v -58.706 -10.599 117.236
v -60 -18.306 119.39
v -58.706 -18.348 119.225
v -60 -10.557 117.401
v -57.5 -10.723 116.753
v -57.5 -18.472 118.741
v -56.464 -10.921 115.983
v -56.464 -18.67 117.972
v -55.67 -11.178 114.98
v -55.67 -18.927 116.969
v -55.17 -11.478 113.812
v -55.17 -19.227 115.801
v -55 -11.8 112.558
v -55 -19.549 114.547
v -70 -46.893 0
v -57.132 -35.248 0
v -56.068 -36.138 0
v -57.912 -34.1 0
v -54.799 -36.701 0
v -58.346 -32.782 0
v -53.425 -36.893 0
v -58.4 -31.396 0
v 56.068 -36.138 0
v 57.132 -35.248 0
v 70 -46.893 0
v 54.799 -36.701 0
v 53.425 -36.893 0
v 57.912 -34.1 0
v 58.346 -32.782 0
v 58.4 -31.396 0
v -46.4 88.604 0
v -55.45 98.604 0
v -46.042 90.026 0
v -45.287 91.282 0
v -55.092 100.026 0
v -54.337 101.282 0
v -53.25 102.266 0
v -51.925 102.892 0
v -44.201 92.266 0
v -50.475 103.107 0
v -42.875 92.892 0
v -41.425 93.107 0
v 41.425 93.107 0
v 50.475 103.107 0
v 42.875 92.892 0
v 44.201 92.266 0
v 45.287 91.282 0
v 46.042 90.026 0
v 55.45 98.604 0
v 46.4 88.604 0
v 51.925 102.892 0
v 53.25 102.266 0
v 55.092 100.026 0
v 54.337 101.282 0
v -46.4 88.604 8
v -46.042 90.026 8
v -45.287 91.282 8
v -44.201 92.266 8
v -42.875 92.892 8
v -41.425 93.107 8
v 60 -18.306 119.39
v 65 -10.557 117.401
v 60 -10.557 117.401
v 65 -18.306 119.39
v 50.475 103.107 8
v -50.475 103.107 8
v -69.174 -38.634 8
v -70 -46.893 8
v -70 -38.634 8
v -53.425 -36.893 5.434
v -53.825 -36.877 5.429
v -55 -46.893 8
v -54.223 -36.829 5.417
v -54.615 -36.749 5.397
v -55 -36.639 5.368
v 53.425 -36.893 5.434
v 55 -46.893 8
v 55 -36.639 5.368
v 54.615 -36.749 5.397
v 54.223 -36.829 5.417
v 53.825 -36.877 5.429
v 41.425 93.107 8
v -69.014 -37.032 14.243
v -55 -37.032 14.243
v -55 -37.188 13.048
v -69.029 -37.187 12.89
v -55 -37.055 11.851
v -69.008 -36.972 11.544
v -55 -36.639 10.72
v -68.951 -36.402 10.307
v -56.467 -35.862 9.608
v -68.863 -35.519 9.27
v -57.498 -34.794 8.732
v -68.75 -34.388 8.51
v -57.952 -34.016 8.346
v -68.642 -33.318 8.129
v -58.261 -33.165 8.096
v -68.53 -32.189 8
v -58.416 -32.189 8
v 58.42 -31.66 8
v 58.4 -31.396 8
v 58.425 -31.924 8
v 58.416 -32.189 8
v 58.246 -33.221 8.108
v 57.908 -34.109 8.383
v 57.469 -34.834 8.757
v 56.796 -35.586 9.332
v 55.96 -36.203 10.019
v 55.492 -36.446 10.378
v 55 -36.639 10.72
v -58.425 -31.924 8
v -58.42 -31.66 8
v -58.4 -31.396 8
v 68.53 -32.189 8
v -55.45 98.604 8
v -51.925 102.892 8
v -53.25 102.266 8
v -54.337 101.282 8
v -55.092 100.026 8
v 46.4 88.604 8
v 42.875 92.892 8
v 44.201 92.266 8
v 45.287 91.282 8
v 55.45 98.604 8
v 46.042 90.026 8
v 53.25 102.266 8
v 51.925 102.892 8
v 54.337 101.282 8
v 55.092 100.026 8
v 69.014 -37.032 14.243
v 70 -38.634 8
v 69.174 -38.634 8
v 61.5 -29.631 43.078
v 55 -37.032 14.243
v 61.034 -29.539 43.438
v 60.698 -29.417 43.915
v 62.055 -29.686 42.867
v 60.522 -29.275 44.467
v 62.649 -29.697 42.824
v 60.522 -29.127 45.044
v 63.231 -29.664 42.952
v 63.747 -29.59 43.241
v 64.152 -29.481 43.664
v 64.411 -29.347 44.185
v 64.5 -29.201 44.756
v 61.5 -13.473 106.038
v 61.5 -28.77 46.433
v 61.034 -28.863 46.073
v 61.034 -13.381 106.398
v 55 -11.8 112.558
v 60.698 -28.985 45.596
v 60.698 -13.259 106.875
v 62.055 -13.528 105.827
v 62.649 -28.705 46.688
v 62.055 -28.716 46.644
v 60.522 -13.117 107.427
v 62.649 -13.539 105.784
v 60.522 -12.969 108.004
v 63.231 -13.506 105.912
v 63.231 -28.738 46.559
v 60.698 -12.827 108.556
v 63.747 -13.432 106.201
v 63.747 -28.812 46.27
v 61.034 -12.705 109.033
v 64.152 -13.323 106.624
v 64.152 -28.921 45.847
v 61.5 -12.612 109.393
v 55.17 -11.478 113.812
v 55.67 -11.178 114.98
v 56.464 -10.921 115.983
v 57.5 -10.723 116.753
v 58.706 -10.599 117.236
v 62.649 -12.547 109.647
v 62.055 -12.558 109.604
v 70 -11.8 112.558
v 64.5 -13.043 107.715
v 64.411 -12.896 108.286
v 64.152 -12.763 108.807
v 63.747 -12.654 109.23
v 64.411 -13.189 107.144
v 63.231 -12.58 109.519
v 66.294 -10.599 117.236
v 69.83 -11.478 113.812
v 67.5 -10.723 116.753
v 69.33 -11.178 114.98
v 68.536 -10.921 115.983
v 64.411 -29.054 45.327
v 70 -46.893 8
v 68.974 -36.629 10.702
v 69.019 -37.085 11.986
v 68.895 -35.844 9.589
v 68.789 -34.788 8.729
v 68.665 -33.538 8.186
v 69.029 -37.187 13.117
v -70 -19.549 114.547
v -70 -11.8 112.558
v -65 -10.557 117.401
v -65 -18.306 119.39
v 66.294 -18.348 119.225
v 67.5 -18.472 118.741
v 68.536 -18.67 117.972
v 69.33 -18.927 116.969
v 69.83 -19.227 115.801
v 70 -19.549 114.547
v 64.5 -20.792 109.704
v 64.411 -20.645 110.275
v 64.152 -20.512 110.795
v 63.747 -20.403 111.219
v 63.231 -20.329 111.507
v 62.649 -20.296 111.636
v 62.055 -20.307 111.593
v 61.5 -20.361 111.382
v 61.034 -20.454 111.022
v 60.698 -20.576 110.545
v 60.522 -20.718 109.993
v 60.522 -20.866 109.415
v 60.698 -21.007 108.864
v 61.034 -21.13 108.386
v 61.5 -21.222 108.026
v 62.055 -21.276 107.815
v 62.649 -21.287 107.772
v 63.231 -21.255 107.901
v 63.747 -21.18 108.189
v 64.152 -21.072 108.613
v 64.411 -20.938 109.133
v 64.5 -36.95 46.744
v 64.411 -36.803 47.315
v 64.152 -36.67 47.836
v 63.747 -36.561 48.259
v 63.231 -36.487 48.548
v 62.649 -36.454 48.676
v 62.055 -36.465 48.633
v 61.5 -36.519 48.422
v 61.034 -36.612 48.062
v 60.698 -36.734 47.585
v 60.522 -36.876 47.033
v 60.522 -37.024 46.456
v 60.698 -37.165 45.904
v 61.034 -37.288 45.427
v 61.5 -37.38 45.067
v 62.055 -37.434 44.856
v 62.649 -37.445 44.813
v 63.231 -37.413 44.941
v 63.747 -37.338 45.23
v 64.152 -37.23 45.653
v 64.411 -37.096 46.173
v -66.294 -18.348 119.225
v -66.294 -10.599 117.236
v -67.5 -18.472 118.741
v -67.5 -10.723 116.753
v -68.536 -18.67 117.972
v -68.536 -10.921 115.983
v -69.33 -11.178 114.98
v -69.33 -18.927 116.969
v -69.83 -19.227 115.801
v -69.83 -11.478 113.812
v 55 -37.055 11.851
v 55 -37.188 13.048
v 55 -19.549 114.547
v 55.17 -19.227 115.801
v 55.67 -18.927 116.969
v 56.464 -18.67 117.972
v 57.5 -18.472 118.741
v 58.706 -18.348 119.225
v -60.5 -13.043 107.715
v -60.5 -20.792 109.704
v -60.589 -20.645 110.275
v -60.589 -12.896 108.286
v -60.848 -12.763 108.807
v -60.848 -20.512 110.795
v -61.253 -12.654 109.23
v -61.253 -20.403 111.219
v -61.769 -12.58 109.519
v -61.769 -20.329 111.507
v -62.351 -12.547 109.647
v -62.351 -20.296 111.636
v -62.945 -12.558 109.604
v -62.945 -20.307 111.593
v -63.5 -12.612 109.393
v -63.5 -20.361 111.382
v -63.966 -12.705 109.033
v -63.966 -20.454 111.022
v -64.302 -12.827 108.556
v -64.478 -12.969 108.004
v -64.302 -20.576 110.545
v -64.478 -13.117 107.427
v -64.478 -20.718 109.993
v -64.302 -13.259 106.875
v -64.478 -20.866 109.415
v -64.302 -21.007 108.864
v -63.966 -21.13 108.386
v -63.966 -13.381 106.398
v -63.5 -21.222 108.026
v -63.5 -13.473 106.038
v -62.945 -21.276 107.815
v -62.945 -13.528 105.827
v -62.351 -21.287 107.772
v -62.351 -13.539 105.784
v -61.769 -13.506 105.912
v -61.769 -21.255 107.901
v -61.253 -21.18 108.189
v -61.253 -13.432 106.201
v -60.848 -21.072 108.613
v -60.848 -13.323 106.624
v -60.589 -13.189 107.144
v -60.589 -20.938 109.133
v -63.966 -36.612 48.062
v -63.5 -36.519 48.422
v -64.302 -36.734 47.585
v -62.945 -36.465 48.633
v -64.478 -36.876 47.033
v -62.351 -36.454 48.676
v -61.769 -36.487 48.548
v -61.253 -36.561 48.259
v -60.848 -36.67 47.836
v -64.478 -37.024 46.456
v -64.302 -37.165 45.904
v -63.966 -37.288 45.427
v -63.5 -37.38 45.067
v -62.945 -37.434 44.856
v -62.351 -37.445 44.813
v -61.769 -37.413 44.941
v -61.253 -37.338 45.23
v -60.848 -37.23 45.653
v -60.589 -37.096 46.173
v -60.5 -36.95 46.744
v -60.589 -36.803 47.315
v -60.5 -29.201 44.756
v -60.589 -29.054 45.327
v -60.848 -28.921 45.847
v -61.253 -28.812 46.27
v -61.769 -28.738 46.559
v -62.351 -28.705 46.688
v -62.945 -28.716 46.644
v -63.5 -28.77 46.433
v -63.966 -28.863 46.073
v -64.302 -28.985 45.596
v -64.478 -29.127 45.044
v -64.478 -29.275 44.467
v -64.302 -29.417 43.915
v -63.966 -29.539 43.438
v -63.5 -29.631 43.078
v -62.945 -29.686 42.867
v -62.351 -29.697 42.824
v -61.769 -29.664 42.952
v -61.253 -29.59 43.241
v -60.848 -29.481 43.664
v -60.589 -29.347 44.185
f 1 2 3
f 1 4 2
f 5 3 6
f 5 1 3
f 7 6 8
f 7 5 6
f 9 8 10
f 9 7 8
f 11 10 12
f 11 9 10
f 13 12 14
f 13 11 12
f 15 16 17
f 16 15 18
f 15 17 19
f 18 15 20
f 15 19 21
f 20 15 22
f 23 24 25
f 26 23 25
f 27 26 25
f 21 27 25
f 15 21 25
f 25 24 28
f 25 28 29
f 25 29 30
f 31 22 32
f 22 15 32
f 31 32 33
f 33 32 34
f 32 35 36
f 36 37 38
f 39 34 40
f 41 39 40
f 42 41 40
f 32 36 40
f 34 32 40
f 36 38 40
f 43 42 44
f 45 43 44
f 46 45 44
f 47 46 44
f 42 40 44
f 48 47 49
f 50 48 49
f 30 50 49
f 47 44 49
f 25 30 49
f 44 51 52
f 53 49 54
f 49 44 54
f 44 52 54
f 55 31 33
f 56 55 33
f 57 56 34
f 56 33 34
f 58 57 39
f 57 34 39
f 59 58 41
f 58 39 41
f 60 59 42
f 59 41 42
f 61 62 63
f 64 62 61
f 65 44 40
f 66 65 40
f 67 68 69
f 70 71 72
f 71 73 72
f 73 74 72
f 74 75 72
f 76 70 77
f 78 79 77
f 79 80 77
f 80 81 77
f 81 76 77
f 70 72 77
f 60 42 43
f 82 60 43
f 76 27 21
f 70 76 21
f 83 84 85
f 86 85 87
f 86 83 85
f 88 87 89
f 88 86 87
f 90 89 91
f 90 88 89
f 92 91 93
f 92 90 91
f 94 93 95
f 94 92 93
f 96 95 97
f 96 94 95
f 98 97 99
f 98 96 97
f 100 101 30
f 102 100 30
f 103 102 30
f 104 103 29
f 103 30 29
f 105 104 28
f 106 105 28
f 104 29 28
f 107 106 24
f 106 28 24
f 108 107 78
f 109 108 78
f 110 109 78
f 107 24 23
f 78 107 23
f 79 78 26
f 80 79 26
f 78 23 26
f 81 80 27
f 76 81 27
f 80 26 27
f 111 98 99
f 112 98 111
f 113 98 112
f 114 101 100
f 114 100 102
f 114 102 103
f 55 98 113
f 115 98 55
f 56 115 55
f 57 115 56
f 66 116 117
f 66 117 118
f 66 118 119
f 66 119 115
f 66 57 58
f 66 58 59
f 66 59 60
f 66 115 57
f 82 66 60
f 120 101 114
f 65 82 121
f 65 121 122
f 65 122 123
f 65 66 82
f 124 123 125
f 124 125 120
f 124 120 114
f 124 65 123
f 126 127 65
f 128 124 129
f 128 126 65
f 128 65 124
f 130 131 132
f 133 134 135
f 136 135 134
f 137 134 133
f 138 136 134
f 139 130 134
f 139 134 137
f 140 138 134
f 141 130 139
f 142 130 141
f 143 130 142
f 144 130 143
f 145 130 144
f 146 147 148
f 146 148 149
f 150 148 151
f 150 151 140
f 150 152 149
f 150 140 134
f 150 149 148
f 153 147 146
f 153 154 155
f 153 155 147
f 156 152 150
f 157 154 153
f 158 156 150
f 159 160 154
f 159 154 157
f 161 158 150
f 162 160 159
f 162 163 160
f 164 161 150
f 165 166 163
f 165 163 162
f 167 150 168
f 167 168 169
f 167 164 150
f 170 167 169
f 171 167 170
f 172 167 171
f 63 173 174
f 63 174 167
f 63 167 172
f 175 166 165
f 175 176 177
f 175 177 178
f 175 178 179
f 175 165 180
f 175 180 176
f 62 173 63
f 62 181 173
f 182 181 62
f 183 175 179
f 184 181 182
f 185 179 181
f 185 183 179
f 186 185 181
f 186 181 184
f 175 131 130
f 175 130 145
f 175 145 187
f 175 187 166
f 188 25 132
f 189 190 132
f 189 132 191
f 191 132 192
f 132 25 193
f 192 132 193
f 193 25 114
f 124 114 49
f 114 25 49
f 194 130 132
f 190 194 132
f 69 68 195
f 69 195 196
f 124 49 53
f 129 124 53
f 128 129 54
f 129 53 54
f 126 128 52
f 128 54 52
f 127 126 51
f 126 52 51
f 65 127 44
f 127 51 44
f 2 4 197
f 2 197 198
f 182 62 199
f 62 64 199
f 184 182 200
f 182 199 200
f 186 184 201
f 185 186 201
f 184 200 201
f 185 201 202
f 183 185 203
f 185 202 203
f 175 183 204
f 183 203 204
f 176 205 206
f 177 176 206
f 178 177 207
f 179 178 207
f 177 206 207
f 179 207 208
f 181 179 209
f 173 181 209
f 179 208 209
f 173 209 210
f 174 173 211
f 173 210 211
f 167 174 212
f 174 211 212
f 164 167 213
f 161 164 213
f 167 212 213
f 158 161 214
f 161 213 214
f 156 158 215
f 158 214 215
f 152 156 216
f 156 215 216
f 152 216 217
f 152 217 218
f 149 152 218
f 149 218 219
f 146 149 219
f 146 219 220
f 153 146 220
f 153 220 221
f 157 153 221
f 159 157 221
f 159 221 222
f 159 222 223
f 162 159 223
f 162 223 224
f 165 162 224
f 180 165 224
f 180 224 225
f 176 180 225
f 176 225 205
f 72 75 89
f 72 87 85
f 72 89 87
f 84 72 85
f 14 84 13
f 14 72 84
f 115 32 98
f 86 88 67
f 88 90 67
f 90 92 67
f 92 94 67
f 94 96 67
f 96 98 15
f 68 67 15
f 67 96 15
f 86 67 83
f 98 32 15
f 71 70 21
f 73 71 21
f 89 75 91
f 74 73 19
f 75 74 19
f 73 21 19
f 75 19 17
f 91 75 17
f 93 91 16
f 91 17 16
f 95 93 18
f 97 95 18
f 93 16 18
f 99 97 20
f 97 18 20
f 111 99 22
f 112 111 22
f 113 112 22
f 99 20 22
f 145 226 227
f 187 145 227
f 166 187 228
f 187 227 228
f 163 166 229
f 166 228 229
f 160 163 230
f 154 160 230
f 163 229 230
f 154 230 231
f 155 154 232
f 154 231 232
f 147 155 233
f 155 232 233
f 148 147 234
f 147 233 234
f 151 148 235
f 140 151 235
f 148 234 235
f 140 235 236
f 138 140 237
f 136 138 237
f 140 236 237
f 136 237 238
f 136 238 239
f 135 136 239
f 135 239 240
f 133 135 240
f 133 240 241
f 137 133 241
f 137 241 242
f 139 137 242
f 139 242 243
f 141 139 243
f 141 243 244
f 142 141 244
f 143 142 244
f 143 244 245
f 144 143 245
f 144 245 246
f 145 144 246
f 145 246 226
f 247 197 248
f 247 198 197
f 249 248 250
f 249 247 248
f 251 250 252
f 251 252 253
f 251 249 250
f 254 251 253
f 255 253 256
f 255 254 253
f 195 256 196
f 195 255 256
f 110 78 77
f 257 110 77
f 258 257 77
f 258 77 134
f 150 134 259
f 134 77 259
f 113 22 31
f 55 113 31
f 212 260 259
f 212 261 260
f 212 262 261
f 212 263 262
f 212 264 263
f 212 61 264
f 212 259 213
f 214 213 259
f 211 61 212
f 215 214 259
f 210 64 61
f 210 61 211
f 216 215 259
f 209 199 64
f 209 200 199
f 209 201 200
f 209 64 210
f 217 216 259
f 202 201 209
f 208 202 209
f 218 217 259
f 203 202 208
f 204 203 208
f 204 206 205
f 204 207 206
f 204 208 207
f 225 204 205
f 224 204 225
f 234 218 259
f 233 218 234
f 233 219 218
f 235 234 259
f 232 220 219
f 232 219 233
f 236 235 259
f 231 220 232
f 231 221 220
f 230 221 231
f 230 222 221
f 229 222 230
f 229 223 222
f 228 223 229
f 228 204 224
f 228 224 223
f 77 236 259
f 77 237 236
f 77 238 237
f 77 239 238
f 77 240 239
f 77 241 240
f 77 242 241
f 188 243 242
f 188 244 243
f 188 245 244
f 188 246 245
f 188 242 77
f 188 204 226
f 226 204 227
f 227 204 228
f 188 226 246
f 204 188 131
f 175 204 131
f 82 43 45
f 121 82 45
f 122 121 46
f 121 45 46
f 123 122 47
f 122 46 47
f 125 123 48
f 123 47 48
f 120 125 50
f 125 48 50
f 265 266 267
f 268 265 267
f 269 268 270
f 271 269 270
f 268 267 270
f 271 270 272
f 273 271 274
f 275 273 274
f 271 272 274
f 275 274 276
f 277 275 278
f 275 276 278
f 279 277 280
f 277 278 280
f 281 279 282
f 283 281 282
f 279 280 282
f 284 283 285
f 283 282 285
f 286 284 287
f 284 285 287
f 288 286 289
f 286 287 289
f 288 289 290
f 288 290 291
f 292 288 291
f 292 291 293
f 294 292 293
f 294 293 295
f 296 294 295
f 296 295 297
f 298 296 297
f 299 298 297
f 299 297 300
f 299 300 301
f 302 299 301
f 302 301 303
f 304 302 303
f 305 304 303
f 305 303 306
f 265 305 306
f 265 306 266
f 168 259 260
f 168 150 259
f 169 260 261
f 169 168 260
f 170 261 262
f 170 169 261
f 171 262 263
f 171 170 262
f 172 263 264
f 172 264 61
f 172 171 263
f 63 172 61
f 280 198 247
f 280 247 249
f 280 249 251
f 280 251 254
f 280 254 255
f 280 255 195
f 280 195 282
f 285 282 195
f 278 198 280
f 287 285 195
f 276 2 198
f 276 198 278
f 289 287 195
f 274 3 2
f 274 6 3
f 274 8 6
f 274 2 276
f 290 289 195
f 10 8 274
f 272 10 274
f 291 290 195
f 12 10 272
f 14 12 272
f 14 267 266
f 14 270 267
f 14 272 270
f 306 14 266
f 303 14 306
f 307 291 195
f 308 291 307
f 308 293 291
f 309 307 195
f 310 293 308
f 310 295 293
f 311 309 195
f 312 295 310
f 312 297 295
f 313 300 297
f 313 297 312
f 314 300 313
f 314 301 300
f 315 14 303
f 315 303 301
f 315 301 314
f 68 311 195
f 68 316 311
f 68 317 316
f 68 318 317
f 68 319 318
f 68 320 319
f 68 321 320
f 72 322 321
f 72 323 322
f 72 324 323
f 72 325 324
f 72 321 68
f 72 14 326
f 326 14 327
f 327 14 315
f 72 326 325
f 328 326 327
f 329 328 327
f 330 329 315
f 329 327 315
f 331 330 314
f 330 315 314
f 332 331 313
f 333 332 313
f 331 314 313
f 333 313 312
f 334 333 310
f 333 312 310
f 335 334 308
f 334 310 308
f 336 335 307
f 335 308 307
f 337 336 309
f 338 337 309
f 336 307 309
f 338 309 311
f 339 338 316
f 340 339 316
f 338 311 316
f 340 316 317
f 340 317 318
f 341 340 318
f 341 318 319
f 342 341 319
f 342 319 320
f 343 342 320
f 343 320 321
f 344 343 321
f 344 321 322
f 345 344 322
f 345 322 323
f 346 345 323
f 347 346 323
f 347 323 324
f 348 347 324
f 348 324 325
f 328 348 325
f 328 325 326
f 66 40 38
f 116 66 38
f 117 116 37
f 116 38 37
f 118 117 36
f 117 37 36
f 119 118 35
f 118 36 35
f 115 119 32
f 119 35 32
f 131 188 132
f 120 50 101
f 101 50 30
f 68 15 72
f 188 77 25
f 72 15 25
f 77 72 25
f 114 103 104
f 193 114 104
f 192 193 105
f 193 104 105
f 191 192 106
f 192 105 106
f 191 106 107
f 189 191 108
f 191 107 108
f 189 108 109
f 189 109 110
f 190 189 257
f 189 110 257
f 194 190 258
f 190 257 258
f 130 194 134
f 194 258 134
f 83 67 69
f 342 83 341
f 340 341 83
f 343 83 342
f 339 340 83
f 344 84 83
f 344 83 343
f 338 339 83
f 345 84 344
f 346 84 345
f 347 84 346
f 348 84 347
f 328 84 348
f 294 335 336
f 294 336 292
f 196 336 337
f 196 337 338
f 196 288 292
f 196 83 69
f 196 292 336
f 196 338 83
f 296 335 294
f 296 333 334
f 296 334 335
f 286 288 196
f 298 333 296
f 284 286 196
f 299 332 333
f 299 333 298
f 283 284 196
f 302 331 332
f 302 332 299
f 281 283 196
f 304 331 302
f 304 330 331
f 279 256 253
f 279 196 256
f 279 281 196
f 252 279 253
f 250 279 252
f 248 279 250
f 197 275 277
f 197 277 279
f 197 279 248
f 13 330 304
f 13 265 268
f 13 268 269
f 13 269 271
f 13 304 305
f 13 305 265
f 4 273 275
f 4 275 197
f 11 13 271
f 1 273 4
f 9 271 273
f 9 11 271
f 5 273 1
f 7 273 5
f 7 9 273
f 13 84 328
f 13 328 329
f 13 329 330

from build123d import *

# Parameters (mm, degrees)
F1_DEPTH      = 8
F3_DEPTH      = 70
F3_DEPTH_BACK = 70
F4_W          = 110
F4_H          = 115
F4_R          = 2
F5_DEPTH      = 10.5877977107
F6_R          = 5
F7_R          = 5


with BuildPart() as f1:
    # F0 (on Top) → F1 (new body)
    with BuildSketch(Plane.XY):
        with BuildLine():
            Line((-55.4502481405, 98.6044170713), (-70, -46.8931015238))
            Line((-70, -46.8931015238), (70, -46.8931015238))
            Line((70, -46.8931015238), (55.4502481405, 98.6044170713))
            ThreePointArc((55.4502481405, 98.6044170713), (53.8300887932, 101.8141611439), (50.4750621894, 103.1068984762))
            Line((50.4750621894, 103.1068984762), (-50.4750621894, 103.1068984762))
            ThreePointArc((-50.4750621894, 103.1068984762), (-53.8300887932, 101.8141611439), (-55.4502481405, 98.6044170713))
        make_face()
        with BuildLine():
            Line((-41.4251865683, 93.1068984762), (41.4251865683, 93.1068984762))
            ThreePointArc((41.4251865683, 93.1068984762), (44.7802131721, 91.8141611439), (46.4003725194, 88.6044170713))
            Line((46.4003725194, 88.6044170713), (58.4003725194, -31.3955829287))
            ThreePointArc((58.4003725194, -31.3955829287), (57.1324492361, -35.2481281276), (53.4251865683, -36.8931015238))
            Line((53.4251865683, -36.8931015238), (-53.4251865683, -36.8931015238))
            ThreePointArc((-53.4251865683, -36.8931015238), (-57.1324492361, -35.2481281276), (-58.4003725194, -31.3955829287))
            Line((-58.4003725194, -31.3955829287), (-46.4003725194, 88.6044170713))
            ThreePointArc((-46.4003725194, 88.6044170713), (-44.7802131721, 91.8141611439), (-41.4251865683, 93.1068984762))
        make_face(mode=Mode.SUBTRACT)
    extrude(amount=F1_DEPTH)

    # F2 (on Right) → F3 (join, two sides)
    with BuildSketch(Plane.YZ) as f3_sk:
        Polygon((-18.3058557984, 119.3901673481), (-46.8931015238, 8), (-38.633844698, 8), (-35.4294686048, 20.4858474544), (-10.5569745916, 117.4014893846), align=None)
    extrude(amount=F3_DEPTH)
    extrude(f3_sk.sketch, amount=-F3_DEPTH_BACK)

    # F4 (on face) → F5 (cut, through all)
    with BuildSketch(Plane(origin=(0, -45.9216252544, 11.7853560733), x_dir=(1, 0, 0), z_dir=(0, -0.9686101509, 0.2485847454))):
        with Locations((0, 53.5919715017)):
            Rectangle(F4_W, F4_H)
        with Locations((-62.5, 101.0919715017)):
            Circle(F4_R)
        with Locations((-62.5, 36.0919715017)):
            Circle(F4_R)
        with Locations((62.5, 36.0919715017)):
            Circle(F4_R)
        with Locations((62.5, 101.0919715017)):
            Circle(F4_R)
    extrude(amount=-F5_DEPTH, mode=Mode.SUBTRACT)

    # F6
    f6_edges = [f1.edges().sort_by_distance(p)[0] for p in [
        (-70, -14.431415, 118.395828),
        (-55, -14.431415, 118.395828),
        (55, -14.431415, 118.395828),
        (70, -14.431415, 118.395828),
    ]]
    fillet(f6_edges, radius=F6_R)

    # F7
    f7_edges = [f1.edges().sort_by_distance(p)[0] for p in [
        (-62.087037, -38.633845, 8),
        (62.087037, -38.633845, 8),
    ]]
    fillet(f7_edges, radius=F7_R)


solid = f1.part
